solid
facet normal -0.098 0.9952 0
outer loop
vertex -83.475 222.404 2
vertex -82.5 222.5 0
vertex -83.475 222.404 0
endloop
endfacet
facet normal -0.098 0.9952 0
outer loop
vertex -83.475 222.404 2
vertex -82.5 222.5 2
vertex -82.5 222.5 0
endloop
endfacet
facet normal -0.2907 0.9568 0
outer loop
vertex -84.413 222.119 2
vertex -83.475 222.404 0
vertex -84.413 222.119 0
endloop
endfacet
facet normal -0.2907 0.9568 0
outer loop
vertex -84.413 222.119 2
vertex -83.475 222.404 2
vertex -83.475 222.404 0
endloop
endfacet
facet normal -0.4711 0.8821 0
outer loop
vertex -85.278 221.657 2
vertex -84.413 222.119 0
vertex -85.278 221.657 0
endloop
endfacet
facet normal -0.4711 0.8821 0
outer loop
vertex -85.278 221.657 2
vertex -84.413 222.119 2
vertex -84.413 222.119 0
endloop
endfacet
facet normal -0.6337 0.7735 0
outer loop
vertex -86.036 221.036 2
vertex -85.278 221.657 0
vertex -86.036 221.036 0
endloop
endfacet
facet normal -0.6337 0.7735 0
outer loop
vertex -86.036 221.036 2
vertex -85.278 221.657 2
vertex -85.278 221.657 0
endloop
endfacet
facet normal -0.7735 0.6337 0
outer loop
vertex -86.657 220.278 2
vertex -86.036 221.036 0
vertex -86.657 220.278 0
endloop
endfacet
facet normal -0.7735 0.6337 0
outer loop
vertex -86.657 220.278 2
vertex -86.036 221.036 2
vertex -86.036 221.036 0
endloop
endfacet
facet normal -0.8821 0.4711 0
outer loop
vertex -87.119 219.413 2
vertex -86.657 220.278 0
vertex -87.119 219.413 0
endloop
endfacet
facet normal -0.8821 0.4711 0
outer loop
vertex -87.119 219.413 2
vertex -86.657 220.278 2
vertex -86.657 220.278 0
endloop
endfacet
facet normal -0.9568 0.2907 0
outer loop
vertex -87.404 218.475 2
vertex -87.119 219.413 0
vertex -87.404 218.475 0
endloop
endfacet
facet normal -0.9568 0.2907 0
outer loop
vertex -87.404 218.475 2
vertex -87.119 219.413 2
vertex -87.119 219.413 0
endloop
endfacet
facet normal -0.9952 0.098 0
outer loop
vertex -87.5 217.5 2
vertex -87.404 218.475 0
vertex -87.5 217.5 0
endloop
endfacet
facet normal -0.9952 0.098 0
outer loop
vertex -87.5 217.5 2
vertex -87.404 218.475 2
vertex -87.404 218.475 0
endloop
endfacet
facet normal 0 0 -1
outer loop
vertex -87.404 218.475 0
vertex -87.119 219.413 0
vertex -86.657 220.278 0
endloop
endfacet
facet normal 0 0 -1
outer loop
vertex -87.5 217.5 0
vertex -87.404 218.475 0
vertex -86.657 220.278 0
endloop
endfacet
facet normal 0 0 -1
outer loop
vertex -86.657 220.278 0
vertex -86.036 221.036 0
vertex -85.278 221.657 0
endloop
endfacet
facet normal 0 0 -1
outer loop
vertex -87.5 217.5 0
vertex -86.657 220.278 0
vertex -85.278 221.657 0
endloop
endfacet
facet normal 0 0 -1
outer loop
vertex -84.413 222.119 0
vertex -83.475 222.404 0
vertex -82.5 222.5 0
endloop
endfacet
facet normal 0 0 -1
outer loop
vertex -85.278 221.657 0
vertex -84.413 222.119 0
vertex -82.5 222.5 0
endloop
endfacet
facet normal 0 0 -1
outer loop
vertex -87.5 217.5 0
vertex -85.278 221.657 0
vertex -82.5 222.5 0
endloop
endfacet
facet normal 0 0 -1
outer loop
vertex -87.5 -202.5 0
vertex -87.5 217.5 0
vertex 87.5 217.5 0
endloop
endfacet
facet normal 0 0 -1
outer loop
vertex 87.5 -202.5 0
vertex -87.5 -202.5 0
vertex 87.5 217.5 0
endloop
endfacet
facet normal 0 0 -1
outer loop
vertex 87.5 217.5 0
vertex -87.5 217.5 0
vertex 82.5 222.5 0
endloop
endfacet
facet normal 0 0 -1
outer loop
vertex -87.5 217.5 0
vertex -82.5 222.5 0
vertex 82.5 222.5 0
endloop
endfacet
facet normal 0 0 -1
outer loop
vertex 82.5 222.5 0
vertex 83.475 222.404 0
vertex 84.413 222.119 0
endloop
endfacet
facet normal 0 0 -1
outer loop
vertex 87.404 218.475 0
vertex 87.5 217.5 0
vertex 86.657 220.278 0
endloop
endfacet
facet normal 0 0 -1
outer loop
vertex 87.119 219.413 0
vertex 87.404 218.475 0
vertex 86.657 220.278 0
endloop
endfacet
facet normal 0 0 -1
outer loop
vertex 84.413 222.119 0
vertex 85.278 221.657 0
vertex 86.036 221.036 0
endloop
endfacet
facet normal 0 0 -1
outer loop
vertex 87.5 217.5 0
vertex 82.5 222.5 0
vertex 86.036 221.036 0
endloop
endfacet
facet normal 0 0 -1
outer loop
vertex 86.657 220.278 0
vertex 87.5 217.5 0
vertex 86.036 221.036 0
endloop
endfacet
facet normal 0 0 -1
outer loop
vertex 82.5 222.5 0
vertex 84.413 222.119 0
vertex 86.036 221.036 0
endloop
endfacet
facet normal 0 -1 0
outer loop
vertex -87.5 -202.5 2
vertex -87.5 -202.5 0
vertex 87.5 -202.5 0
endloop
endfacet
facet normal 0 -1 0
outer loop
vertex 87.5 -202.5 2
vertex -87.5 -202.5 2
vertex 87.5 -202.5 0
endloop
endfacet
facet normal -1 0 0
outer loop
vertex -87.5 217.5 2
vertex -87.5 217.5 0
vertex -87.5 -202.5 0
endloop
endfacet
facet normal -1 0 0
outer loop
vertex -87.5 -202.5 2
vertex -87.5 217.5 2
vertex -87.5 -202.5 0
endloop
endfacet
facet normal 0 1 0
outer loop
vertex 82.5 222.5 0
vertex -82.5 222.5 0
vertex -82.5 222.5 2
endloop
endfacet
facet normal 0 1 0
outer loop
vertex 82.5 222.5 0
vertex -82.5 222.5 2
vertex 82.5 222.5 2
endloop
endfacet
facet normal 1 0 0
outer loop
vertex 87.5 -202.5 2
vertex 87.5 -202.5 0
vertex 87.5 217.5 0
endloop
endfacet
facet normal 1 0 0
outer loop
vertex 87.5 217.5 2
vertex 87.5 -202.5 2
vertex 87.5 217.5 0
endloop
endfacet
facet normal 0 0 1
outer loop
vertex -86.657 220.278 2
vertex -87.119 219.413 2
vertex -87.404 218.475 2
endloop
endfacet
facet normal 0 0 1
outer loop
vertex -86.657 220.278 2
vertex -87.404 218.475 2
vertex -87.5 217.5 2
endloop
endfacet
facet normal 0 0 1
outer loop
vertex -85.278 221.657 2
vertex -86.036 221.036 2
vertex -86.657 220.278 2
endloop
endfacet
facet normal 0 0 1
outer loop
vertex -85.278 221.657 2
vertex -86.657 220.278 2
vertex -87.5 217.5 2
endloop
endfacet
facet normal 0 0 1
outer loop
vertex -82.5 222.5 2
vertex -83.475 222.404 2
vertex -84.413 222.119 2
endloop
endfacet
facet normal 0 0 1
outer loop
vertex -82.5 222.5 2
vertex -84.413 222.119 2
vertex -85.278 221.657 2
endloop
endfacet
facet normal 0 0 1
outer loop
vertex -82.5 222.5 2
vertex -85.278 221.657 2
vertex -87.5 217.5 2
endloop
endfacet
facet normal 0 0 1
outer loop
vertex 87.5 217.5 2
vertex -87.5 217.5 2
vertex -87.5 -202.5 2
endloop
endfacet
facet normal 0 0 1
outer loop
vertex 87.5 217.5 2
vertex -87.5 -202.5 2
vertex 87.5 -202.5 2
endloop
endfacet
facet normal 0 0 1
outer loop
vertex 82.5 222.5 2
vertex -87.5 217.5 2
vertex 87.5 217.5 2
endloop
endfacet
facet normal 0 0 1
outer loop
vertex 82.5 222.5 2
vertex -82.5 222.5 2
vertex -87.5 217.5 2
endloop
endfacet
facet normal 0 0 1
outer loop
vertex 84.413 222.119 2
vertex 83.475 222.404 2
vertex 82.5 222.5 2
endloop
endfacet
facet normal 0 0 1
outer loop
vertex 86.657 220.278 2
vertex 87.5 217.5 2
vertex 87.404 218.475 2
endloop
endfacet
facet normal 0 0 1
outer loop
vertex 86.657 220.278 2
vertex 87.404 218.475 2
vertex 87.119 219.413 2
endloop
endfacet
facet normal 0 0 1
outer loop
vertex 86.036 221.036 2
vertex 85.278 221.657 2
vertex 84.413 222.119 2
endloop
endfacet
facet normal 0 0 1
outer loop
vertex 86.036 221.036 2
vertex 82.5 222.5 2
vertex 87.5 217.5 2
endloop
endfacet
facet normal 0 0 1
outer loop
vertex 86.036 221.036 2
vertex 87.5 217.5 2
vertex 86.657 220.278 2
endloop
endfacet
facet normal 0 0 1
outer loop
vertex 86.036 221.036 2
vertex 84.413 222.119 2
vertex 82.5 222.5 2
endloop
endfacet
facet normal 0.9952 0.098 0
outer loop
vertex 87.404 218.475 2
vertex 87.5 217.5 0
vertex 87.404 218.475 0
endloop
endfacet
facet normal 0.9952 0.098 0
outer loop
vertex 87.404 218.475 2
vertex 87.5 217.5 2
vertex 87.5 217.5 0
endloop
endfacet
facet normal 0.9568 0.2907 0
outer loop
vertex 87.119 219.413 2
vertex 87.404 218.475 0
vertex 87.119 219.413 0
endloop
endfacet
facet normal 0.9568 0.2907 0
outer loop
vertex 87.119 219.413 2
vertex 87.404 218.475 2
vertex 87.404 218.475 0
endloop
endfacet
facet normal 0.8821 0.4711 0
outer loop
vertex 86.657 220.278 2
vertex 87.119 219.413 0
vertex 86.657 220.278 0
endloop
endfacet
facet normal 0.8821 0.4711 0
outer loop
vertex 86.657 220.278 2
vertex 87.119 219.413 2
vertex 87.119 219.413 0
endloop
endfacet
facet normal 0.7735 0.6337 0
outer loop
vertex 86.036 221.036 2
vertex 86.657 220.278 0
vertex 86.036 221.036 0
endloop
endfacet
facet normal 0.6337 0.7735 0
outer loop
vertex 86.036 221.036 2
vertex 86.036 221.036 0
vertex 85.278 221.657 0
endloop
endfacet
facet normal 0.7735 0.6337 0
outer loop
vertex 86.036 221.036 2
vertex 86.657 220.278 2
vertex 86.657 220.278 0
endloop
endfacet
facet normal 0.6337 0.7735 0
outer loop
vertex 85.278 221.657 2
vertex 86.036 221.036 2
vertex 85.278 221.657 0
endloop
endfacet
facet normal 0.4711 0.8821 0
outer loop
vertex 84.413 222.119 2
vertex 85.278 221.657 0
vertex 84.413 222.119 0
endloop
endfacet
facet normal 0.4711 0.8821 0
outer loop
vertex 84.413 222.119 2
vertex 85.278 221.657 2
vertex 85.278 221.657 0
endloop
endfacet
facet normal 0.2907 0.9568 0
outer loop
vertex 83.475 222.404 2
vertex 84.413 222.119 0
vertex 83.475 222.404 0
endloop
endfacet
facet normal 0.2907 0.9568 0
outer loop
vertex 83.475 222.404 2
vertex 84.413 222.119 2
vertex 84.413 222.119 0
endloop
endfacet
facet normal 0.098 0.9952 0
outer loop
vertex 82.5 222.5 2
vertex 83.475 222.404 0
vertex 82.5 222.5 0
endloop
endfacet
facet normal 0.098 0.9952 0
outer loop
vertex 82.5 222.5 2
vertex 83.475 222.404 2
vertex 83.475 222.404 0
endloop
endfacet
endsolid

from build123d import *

# Parameters (mm, degrees)
F0_W     = 175
F0_H     = 405
F0_H_2   = 20
F1_DEPTH = 2
F2_R     = 5


with BuildPart() as f1:
    # F0 (on Top) → F1 (new body)
    with BuildSketch(Plane.XY):
        Rectangle(F0_W, F0_H)
        with Locations((0, 212.5)):
            Rectangle(F0_W, F0_H_2)
    extrude(amount=F1_DEPTH)

    # F2
    f2_edges = [f1.edges().sort_by_distance(p)[0] for p in [
        (87.5, 222.5, 1),
        (-87.5, 222.5, 1),
    ]]
    fillet(f2_edges, radius=F2_R)


solid = f1.part
